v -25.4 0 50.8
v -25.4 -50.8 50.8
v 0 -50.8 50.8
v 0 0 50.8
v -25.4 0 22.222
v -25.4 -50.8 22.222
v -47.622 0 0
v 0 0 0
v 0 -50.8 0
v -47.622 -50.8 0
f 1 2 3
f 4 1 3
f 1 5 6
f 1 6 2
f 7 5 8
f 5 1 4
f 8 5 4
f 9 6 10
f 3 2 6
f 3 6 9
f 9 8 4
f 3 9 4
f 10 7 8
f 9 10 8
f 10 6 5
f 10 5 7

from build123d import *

# Parameters (mm, degrees)
F0_W     = 25.4
F0_H     = 50.8
F1_DEPTH = 50.8
F3_DEPTH = 50.8


with BuildPart() as f1:
    # F0 (on Front) → F1 (new body)
    with BuildSketch(Plane.XZ):
        with Locations((-12.7, 25.4)):
            Rectangle(F0_W, F0_H)
    extrude(amount=F1_DEPTH)

    # F2 (on Front) → F3 (join)
    with BuildSketch(Plane.XZ):
        Polygon((-47.622312, 0), (-22.222312, 0), (-22.222312, 25.4), align=None)
    extrude(amount=F3_DEPTH)


solid = f1.part
